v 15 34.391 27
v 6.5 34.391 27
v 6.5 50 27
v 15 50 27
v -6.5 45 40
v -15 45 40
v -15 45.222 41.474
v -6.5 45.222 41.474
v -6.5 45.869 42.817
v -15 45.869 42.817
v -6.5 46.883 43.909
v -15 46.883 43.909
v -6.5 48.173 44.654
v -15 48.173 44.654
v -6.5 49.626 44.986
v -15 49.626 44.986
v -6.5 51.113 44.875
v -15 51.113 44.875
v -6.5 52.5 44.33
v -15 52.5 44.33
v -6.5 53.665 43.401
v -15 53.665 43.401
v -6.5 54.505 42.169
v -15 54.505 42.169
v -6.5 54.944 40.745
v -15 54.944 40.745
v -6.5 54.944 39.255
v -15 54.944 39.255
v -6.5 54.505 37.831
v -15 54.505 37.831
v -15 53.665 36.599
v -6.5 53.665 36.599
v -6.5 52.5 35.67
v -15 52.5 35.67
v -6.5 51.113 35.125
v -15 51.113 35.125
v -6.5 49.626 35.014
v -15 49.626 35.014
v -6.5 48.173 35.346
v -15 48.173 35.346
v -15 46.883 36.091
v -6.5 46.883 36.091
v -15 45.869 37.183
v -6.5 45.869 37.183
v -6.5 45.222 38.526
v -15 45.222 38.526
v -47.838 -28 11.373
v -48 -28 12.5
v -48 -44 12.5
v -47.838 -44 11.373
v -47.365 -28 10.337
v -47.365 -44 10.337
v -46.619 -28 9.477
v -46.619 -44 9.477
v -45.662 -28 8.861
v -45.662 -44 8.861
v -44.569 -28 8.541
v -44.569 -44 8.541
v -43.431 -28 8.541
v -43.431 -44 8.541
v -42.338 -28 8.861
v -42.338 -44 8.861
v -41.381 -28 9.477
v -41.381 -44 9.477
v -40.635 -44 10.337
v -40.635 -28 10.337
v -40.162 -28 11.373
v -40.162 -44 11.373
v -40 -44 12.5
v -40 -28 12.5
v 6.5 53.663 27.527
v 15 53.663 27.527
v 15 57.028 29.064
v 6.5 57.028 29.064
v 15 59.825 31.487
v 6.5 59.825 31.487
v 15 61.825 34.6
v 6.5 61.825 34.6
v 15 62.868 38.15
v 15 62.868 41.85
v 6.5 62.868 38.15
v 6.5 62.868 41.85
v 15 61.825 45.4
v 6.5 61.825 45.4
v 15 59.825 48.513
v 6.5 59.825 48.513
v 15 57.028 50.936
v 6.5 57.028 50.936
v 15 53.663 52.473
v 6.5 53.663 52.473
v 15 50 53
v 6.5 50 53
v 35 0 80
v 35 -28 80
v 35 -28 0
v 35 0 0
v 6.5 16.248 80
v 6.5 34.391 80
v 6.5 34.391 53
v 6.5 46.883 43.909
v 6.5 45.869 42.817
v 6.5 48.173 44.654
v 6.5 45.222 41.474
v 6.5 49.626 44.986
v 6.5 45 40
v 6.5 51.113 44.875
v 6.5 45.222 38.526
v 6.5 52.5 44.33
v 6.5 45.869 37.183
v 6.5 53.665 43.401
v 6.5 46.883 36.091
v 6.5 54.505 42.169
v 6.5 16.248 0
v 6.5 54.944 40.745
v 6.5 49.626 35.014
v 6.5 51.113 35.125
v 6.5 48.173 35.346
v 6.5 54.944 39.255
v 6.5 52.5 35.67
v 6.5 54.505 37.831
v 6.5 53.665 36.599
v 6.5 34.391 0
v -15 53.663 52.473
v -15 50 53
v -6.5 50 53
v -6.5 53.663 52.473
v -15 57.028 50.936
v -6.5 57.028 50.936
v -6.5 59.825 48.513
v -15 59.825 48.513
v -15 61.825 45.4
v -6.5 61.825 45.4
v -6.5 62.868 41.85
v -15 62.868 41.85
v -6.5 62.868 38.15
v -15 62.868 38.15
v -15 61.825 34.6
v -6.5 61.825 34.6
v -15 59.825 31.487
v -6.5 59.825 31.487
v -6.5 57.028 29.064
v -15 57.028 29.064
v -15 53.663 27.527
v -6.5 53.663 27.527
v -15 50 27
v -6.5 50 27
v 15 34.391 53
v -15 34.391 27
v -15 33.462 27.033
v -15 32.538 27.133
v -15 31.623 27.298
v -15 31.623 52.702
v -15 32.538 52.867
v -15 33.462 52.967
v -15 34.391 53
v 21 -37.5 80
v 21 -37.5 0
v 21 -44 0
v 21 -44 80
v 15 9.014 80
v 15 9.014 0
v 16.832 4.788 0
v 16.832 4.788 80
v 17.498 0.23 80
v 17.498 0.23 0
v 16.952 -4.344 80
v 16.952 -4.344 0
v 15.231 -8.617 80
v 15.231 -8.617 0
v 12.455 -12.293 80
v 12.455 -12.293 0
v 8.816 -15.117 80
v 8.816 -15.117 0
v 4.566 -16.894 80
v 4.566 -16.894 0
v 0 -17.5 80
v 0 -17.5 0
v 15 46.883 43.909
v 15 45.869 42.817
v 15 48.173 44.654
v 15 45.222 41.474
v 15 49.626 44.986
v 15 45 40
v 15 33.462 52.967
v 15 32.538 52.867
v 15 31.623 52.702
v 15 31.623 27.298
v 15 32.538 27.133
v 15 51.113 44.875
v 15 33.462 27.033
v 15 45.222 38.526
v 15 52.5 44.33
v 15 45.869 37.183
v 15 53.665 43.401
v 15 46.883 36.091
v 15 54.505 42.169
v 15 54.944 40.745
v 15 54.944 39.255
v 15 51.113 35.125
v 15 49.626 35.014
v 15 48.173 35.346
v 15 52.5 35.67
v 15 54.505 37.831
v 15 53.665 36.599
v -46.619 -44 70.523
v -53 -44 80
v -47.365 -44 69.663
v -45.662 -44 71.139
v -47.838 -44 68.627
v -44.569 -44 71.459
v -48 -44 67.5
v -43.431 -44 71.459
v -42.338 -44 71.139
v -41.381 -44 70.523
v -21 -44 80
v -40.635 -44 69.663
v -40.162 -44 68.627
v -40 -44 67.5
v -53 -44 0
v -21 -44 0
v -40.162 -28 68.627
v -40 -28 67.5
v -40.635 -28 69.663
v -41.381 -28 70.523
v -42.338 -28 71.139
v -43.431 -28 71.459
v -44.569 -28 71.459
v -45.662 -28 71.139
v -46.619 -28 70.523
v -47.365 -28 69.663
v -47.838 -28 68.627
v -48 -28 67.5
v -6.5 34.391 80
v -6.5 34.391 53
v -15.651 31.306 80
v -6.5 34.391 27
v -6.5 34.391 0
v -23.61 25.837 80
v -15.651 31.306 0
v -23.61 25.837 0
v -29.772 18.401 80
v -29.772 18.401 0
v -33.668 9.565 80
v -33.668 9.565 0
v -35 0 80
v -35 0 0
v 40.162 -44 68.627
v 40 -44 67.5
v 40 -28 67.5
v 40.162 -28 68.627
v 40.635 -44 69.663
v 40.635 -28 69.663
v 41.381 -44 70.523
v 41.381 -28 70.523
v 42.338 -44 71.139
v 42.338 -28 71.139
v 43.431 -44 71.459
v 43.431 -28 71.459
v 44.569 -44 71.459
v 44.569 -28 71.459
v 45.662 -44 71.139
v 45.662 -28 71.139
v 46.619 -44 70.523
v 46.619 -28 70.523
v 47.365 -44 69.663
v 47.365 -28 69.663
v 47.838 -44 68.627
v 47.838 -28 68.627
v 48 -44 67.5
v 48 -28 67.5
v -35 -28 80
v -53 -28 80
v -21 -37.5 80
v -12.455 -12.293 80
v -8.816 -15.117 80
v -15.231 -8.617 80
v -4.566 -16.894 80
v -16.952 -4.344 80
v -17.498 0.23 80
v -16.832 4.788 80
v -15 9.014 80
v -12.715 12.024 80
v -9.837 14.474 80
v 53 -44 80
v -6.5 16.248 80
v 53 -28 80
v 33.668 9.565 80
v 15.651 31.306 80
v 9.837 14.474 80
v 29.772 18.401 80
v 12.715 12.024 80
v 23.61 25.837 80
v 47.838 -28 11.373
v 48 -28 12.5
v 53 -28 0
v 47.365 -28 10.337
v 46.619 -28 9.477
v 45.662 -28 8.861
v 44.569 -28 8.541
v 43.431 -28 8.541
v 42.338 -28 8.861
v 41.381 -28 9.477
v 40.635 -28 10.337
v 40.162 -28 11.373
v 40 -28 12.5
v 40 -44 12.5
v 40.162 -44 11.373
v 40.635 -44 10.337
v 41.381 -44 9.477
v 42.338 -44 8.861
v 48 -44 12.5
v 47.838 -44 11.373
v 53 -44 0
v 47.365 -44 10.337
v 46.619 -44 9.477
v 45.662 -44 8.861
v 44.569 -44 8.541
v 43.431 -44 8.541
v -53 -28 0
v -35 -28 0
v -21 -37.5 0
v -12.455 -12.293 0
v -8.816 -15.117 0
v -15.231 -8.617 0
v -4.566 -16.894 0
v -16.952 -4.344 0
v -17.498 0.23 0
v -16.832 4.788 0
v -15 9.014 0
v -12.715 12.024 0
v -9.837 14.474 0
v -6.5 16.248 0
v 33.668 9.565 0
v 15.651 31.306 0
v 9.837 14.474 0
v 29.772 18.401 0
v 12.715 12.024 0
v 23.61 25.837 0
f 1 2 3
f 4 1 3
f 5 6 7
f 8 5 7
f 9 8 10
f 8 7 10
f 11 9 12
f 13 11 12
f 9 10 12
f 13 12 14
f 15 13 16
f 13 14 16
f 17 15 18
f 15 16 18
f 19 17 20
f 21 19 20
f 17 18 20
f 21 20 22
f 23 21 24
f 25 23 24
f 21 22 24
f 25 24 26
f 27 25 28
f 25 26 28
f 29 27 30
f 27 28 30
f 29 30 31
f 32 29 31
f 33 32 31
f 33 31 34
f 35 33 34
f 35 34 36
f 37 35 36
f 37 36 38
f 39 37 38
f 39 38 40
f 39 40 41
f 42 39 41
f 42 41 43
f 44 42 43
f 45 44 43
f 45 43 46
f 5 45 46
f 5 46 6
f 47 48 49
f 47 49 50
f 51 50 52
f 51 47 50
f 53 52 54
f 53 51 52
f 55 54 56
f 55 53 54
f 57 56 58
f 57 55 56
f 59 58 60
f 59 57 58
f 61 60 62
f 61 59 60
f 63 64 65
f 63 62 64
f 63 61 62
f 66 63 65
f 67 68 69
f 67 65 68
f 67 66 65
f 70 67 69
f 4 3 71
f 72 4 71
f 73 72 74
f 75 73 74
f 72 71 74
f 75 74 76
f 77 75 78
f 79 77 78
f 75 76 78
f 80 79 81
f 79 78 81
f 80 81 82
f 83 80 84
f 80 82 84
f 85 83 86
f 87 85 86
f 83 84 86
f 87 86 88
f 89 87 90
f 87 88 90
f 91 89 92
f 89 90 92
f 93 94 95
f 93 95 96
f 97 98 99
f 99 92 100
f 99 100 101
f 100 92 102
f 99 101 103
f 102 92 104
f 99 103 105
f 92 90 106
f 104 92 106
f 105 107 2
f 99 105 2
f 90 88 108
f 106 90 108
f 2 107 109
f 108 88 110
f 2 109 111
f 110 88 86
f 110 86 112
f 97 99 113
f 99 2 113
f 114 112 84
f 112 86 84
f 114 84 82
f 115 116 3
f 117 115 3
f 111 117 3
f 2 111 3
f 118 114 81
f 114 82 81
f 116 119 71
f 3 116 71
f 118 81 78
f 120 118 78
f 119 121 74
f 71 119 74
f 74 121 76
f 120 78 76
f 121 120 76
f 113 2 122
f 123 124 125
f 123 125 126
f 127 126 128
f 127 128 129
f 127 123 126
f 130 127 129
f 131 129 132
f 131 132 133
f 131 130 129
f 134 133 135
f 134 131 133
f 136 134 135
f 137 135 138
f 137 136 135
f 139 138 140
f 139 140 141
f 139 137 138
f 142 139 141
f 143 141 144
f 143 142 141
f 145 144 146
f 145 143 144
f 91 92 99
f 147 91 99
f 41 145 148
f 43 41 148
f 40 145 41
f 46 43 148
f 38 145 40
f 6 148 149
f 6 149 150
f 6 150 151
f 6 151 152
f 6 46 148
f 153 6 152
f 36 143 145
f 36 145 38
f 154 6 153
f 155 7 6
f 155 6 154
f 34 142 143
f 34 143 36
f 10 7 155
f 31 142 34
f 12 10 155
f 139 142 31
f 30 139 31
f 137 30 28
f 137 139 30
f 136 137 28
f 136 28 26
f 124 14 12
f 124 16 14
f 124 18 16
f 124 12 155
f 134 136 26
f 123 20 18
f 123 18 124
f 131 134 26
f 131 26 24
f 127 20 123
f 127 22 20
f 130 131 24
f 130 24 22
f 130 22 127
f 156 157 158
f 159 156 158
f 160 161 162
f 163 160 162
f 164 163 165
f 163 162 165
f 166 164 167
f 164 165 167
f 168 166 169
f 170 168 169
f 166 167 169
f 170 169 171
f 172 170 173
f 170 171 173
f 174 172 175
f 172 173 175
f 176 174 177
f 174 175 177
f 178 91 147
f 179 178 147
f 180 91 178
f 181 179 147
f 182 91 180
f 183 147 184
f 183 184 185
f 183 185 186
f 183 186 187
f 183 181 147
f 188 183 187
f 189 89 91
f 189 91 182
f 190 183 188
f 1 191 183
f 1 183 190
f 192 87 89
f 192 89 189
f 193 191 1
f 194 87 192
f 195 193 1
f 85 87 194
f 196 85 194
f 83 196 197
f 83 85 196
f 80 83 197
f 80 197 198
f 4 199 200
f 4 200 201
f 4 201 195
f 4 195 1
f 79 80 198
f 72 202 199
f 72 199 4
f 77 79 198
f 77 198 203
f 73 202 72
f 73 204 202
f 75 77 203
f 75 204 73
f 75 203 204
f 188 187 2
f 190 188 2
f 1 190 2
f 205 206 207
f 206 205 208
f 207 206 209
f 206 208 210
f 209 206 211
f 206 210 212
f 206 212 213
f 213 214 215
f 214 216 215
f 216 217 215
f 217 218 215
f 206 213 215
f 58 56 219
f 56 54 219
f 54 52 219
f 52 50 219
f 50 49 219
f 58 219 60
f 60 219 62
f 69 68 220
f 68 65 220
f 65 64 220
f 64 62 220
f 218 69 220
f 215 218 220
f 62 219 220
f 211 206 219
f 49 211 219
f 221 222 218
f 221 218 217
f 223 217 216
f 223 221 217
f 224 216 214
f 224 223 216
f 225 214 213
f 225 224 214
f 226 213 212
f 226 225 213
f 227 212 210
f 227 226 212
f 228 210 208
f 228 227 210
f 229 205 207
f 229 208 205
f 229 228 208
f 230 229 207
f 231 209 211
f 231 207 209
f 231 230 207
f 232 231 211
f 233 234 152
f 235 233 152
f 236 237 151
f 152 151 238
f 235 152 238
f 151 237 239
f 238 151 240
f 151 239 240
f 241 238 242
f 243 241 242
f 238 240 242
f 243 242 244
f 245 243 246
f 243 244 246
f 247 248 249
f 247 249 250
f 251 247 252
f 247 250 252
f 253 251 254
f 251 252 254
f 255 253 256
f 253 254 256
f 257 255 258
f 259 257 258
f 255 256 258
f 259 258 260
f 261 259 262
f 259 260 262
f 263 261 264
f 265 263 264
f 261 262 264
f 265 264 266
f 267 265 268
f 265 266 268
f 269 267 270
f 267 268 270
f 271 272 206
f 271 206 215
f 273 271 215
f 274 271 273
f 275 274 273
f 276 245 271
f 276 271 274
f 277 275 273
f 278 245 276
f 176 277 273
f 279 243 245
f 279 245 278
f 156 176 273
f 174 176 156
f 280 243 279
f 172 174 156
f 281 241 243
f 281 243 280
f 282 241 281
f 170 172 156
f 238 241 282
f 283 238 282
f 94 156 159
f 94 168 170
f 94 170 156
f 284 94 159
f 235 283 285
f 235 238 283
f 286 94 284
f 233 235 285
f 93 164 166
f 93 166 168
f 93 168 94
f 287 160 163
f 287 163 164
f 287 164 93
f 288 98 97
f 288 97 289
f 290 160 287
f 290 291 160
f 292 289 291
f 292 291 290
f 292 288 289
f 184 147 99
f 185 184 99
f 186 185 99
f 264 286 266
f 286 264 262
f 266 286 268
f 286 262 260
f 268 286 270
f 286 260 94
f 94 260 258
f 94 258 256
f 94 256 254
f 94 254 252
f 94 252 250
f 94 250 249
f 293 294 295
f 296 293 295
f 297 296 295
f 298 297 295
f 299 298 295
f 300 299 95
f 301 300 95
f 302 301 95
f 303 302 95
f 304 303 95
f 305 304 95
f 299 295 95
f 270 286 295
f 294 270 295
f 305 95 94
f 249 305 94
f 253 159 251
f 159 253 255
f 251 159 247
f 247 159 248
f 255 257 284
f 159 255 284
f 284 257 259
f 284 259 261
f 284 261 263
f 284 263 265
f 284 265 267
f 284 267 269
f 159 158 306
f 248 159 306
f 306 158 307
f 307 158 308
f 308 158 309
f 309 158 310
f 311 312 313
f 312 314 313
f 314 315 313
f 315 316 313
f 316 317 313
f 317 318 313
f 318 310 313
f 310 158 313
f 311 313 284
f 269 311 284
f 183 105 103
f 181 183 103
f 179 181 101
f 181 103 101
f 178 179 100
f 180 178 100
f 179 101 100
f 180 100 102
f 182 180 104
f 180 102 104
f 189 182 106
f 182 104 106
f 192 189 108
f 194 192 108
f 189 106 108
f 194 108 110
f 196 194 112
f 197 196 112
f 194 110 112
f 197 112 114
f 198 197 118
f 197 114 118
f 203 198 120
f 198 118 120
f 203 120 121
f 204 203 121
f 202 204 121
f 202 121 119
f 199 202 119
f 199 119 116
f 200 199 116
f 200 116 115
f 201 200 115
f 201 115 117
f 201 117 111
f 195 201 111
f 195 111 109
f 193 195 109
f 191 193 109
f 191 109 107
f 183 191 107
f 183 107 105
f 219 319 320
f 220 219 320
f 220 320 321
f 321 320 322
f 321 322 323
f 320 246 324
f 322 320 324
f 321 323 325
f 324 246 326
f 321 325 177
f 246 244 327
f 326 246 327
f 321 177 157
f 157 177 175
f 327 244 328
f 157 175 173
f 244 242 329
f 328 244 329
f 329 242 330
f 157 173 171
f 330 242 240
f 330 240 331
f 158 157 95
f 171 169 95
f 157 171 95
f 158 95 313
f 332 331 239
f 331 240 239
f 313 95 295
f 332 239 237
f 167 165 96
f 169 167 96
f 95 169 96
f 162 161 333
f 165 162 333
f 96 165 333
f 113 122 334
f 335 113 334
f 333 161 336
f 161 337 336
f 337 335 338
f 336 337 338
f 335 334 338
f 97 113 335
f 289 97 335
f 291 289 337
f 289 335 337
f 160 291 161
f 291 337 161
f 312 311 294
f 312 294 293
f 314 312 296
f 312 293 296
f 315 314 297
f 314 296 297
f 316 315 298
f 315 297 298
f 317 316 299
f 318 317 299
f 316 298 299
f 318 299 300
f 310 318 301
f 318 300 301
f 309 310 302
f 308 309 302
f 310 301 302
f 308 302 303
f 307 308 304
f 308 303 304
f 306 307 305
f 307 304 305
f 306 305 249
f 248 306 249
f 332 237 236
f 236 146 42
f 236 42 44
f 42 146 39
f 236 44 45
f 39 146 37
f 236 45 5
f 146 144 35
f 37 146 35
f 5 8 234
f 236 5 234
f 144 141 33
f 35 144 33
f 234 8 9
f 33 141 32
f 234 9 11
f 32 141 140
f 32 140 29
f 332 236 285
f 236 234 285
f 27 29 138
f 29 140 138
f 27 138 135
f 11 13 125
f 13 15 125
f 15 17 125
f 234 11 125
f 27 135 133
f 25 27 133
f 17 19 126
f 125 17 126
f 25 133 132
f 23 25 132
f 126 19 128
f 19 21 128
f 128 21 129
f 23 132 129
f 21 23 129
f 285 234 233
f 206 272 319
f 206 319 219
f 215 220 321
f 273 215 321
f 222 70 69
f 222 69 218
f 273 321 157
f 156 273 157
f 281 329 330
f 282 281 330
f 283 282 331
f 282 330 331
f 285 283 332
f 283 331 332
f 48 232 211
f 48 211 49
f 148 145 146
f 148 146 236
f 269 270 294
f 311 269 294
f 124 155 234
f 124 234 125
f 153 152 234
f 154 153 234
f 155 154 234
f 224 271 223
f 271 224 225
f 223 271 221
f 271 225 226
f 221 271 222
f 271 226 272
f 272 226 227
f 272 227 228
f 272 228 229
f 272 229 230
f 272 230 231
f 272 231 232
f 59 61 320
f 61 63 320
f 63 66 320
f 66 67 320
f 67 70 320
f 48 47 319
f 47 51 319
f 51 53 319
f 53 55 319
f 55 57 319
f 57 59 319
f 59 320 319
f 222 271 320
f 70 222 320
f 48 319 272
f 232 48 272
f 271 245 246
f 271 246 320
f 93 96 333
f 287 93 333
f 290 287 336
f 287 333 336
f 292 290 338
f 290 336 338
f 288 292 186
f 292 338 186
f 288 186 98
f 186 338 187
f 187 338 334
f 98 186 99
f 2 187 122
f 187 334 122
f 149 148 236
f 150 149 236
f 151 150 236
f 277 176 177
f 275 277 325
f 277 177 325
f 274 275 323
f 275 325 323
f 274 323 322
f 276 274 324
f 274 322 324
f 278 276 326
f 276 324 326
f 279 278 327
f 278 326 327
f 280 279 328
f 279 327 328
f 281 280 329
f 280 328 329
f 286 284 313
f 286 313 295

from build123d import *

# Parameters (mm, degrees)
BOSS_EXTRUDE1_DEPTH        = 80
BOSS_EXTRUDE3_DEPTH        = 8.5
BOSS_EXTRUDE4_START        = -8.5
BOSS_EXTRUDE4_DEPTH        = 8.5
F_10_0_10_DIAMETER_HOLE1_D = 10
CUT_EXTRUDE1_DEPTH         = 133.249763765


with BuildPart() as part:
    # Sketch2 → Boss-Extrude1 (new body)
    with BuildSketch(Plane.XY):
        with BuildLine():
            Line((-21, -37.5), (0, -37.5))
            Line((0, -37.5), (0, -17.5))
            ThreePointArc((0, -17.5), (-15.231429157, -8.617050879), (-15, 9.013878189))
            ThreePointArc((-15, 9.013878189), (-11.342217923, 13.326818547), (-6.5, 16.248076809))
            Line((-6.5, 16.248076809), (-6.5, 34.391132578))
            ThreePointArc((-6.5, 34.391132578), (-26.949025956, 22.332711434), (-35, 0))
            Line((-35, 0), (-35, -28))
            Line((-35, -28), (-53, -28))
            Line((-53, -28), (-53, -44))
            Line((-53, -44), (-21, -44))
            Line((-21, -44), (-21, -37.5))
        make_face()
        with BuildLine():
            Line((0, -17.5), (0, -37.5))
            Line((0, -37.5), (21, -37.5))
            Line((21, -37.5), (21, -44))
            Line((21, -44), (53, -44))
            Line((53, -44), (53, -28))
            Line((53, -28), (35, -28))
            Line((35, -28), (35, 0))
            ThreePointArc((35, 0), (26.949025956, 22.332711434), (6.5, 34.391132578))
            Line((6.5, 34.391132578), (6.5, 16.248076809))
            ThreePointArc((6.5, 16.248076809), (11.342217923, 13.326818547), (15, 9.013878189))
            ThreePointArc((15, 9.013878189), (15.231429157, -8.617050879), (0, -17.5))
        make_face()
    extrude(amount=BOSS_EXTRUDE1_DEPTH)

    # Sketch5 → Boss-Extrude3 (add)
    with BuildSketch(Plane.ZY.offset(-6.5)):
        with BuildLine():
            Line((27, 34.391132578), (27, 50))
            ThreePointArc((27, 50), (40, 63), (53, 50))
            Line((53, 50), (53, 34.391132578))
            ThreePointArc((53, 34.391132578), (40, 21.391132578), (27, 34.391132578))
        make_face()
    extrude(amount=-BOSS_EXTRUDE3_DEPTH)

    # Sketch3 → Boss-Extrude4 (add)
    with BuildSketch(Plane(origin=(-6.5, 0, 0), x_dir=(0, 0, -1), z_dir=(1, 0, 0)).offset(BOSS_EXTRUDE4_START)):
        with BuildLine():
            Line((-53, 34.391132578), (-53, 50))
            ThreePointArc((-53, 50), (-40, 63), (-27, 50))
            Line((-27, 50), (-27, 34.391132578))
            ThreePointArc((-27, 34.391132578), (-40, 21.391132578), (-53, 34.391132578))
        make_face()
    extrude(amount=BOSS_EXTRUDE4_DEPTH)

    # Ø10.0 (10) Diameter Hole1 (through all)
    with Locations(Plane(origin=(15, 50, 40), x_dir=(0, 1, 0), z_dir=(1, 0, 0))):
        with Locations((0, 0)):
            Hole(F_10_0_10_DIAMETER_HOLE1_D / 2)

    # Sketch7 → Cut-Extrude1 (cut, through all)
    with BuildSketch(Plane(origin=(0, -28, 0), x_dir=(1, 0, 0), z_dir=(0, 1, 0))):
        with BuildLine():
            Line((-40, -12.5), (-40, -67.5))
            ThreePointArc((-40, -67.5), (-44, -71.5), (-48, -67.5))
            Line((-48, -67.5), (-48, -12.5))
            ThreePointArc((-48, -12.5), (-44, -8.5), (-40, -12.5))
        make_face()
        with BuildLine():
            Line((40, -12.5), (40, -67.5))
            ThreePointArc((40, -67.5), (44, -71.5), (48, -67.5))
            Line((48, -67.5), (48, -12.5))
            ThreePointArc((48, -12.5), (44, -8.5), (40, -12.5))
        make_face()
    extrude(amount=-CUT_EXTRUDE1_DEPTH, mode=Mode.SUBTRACT)


solid = part.part
